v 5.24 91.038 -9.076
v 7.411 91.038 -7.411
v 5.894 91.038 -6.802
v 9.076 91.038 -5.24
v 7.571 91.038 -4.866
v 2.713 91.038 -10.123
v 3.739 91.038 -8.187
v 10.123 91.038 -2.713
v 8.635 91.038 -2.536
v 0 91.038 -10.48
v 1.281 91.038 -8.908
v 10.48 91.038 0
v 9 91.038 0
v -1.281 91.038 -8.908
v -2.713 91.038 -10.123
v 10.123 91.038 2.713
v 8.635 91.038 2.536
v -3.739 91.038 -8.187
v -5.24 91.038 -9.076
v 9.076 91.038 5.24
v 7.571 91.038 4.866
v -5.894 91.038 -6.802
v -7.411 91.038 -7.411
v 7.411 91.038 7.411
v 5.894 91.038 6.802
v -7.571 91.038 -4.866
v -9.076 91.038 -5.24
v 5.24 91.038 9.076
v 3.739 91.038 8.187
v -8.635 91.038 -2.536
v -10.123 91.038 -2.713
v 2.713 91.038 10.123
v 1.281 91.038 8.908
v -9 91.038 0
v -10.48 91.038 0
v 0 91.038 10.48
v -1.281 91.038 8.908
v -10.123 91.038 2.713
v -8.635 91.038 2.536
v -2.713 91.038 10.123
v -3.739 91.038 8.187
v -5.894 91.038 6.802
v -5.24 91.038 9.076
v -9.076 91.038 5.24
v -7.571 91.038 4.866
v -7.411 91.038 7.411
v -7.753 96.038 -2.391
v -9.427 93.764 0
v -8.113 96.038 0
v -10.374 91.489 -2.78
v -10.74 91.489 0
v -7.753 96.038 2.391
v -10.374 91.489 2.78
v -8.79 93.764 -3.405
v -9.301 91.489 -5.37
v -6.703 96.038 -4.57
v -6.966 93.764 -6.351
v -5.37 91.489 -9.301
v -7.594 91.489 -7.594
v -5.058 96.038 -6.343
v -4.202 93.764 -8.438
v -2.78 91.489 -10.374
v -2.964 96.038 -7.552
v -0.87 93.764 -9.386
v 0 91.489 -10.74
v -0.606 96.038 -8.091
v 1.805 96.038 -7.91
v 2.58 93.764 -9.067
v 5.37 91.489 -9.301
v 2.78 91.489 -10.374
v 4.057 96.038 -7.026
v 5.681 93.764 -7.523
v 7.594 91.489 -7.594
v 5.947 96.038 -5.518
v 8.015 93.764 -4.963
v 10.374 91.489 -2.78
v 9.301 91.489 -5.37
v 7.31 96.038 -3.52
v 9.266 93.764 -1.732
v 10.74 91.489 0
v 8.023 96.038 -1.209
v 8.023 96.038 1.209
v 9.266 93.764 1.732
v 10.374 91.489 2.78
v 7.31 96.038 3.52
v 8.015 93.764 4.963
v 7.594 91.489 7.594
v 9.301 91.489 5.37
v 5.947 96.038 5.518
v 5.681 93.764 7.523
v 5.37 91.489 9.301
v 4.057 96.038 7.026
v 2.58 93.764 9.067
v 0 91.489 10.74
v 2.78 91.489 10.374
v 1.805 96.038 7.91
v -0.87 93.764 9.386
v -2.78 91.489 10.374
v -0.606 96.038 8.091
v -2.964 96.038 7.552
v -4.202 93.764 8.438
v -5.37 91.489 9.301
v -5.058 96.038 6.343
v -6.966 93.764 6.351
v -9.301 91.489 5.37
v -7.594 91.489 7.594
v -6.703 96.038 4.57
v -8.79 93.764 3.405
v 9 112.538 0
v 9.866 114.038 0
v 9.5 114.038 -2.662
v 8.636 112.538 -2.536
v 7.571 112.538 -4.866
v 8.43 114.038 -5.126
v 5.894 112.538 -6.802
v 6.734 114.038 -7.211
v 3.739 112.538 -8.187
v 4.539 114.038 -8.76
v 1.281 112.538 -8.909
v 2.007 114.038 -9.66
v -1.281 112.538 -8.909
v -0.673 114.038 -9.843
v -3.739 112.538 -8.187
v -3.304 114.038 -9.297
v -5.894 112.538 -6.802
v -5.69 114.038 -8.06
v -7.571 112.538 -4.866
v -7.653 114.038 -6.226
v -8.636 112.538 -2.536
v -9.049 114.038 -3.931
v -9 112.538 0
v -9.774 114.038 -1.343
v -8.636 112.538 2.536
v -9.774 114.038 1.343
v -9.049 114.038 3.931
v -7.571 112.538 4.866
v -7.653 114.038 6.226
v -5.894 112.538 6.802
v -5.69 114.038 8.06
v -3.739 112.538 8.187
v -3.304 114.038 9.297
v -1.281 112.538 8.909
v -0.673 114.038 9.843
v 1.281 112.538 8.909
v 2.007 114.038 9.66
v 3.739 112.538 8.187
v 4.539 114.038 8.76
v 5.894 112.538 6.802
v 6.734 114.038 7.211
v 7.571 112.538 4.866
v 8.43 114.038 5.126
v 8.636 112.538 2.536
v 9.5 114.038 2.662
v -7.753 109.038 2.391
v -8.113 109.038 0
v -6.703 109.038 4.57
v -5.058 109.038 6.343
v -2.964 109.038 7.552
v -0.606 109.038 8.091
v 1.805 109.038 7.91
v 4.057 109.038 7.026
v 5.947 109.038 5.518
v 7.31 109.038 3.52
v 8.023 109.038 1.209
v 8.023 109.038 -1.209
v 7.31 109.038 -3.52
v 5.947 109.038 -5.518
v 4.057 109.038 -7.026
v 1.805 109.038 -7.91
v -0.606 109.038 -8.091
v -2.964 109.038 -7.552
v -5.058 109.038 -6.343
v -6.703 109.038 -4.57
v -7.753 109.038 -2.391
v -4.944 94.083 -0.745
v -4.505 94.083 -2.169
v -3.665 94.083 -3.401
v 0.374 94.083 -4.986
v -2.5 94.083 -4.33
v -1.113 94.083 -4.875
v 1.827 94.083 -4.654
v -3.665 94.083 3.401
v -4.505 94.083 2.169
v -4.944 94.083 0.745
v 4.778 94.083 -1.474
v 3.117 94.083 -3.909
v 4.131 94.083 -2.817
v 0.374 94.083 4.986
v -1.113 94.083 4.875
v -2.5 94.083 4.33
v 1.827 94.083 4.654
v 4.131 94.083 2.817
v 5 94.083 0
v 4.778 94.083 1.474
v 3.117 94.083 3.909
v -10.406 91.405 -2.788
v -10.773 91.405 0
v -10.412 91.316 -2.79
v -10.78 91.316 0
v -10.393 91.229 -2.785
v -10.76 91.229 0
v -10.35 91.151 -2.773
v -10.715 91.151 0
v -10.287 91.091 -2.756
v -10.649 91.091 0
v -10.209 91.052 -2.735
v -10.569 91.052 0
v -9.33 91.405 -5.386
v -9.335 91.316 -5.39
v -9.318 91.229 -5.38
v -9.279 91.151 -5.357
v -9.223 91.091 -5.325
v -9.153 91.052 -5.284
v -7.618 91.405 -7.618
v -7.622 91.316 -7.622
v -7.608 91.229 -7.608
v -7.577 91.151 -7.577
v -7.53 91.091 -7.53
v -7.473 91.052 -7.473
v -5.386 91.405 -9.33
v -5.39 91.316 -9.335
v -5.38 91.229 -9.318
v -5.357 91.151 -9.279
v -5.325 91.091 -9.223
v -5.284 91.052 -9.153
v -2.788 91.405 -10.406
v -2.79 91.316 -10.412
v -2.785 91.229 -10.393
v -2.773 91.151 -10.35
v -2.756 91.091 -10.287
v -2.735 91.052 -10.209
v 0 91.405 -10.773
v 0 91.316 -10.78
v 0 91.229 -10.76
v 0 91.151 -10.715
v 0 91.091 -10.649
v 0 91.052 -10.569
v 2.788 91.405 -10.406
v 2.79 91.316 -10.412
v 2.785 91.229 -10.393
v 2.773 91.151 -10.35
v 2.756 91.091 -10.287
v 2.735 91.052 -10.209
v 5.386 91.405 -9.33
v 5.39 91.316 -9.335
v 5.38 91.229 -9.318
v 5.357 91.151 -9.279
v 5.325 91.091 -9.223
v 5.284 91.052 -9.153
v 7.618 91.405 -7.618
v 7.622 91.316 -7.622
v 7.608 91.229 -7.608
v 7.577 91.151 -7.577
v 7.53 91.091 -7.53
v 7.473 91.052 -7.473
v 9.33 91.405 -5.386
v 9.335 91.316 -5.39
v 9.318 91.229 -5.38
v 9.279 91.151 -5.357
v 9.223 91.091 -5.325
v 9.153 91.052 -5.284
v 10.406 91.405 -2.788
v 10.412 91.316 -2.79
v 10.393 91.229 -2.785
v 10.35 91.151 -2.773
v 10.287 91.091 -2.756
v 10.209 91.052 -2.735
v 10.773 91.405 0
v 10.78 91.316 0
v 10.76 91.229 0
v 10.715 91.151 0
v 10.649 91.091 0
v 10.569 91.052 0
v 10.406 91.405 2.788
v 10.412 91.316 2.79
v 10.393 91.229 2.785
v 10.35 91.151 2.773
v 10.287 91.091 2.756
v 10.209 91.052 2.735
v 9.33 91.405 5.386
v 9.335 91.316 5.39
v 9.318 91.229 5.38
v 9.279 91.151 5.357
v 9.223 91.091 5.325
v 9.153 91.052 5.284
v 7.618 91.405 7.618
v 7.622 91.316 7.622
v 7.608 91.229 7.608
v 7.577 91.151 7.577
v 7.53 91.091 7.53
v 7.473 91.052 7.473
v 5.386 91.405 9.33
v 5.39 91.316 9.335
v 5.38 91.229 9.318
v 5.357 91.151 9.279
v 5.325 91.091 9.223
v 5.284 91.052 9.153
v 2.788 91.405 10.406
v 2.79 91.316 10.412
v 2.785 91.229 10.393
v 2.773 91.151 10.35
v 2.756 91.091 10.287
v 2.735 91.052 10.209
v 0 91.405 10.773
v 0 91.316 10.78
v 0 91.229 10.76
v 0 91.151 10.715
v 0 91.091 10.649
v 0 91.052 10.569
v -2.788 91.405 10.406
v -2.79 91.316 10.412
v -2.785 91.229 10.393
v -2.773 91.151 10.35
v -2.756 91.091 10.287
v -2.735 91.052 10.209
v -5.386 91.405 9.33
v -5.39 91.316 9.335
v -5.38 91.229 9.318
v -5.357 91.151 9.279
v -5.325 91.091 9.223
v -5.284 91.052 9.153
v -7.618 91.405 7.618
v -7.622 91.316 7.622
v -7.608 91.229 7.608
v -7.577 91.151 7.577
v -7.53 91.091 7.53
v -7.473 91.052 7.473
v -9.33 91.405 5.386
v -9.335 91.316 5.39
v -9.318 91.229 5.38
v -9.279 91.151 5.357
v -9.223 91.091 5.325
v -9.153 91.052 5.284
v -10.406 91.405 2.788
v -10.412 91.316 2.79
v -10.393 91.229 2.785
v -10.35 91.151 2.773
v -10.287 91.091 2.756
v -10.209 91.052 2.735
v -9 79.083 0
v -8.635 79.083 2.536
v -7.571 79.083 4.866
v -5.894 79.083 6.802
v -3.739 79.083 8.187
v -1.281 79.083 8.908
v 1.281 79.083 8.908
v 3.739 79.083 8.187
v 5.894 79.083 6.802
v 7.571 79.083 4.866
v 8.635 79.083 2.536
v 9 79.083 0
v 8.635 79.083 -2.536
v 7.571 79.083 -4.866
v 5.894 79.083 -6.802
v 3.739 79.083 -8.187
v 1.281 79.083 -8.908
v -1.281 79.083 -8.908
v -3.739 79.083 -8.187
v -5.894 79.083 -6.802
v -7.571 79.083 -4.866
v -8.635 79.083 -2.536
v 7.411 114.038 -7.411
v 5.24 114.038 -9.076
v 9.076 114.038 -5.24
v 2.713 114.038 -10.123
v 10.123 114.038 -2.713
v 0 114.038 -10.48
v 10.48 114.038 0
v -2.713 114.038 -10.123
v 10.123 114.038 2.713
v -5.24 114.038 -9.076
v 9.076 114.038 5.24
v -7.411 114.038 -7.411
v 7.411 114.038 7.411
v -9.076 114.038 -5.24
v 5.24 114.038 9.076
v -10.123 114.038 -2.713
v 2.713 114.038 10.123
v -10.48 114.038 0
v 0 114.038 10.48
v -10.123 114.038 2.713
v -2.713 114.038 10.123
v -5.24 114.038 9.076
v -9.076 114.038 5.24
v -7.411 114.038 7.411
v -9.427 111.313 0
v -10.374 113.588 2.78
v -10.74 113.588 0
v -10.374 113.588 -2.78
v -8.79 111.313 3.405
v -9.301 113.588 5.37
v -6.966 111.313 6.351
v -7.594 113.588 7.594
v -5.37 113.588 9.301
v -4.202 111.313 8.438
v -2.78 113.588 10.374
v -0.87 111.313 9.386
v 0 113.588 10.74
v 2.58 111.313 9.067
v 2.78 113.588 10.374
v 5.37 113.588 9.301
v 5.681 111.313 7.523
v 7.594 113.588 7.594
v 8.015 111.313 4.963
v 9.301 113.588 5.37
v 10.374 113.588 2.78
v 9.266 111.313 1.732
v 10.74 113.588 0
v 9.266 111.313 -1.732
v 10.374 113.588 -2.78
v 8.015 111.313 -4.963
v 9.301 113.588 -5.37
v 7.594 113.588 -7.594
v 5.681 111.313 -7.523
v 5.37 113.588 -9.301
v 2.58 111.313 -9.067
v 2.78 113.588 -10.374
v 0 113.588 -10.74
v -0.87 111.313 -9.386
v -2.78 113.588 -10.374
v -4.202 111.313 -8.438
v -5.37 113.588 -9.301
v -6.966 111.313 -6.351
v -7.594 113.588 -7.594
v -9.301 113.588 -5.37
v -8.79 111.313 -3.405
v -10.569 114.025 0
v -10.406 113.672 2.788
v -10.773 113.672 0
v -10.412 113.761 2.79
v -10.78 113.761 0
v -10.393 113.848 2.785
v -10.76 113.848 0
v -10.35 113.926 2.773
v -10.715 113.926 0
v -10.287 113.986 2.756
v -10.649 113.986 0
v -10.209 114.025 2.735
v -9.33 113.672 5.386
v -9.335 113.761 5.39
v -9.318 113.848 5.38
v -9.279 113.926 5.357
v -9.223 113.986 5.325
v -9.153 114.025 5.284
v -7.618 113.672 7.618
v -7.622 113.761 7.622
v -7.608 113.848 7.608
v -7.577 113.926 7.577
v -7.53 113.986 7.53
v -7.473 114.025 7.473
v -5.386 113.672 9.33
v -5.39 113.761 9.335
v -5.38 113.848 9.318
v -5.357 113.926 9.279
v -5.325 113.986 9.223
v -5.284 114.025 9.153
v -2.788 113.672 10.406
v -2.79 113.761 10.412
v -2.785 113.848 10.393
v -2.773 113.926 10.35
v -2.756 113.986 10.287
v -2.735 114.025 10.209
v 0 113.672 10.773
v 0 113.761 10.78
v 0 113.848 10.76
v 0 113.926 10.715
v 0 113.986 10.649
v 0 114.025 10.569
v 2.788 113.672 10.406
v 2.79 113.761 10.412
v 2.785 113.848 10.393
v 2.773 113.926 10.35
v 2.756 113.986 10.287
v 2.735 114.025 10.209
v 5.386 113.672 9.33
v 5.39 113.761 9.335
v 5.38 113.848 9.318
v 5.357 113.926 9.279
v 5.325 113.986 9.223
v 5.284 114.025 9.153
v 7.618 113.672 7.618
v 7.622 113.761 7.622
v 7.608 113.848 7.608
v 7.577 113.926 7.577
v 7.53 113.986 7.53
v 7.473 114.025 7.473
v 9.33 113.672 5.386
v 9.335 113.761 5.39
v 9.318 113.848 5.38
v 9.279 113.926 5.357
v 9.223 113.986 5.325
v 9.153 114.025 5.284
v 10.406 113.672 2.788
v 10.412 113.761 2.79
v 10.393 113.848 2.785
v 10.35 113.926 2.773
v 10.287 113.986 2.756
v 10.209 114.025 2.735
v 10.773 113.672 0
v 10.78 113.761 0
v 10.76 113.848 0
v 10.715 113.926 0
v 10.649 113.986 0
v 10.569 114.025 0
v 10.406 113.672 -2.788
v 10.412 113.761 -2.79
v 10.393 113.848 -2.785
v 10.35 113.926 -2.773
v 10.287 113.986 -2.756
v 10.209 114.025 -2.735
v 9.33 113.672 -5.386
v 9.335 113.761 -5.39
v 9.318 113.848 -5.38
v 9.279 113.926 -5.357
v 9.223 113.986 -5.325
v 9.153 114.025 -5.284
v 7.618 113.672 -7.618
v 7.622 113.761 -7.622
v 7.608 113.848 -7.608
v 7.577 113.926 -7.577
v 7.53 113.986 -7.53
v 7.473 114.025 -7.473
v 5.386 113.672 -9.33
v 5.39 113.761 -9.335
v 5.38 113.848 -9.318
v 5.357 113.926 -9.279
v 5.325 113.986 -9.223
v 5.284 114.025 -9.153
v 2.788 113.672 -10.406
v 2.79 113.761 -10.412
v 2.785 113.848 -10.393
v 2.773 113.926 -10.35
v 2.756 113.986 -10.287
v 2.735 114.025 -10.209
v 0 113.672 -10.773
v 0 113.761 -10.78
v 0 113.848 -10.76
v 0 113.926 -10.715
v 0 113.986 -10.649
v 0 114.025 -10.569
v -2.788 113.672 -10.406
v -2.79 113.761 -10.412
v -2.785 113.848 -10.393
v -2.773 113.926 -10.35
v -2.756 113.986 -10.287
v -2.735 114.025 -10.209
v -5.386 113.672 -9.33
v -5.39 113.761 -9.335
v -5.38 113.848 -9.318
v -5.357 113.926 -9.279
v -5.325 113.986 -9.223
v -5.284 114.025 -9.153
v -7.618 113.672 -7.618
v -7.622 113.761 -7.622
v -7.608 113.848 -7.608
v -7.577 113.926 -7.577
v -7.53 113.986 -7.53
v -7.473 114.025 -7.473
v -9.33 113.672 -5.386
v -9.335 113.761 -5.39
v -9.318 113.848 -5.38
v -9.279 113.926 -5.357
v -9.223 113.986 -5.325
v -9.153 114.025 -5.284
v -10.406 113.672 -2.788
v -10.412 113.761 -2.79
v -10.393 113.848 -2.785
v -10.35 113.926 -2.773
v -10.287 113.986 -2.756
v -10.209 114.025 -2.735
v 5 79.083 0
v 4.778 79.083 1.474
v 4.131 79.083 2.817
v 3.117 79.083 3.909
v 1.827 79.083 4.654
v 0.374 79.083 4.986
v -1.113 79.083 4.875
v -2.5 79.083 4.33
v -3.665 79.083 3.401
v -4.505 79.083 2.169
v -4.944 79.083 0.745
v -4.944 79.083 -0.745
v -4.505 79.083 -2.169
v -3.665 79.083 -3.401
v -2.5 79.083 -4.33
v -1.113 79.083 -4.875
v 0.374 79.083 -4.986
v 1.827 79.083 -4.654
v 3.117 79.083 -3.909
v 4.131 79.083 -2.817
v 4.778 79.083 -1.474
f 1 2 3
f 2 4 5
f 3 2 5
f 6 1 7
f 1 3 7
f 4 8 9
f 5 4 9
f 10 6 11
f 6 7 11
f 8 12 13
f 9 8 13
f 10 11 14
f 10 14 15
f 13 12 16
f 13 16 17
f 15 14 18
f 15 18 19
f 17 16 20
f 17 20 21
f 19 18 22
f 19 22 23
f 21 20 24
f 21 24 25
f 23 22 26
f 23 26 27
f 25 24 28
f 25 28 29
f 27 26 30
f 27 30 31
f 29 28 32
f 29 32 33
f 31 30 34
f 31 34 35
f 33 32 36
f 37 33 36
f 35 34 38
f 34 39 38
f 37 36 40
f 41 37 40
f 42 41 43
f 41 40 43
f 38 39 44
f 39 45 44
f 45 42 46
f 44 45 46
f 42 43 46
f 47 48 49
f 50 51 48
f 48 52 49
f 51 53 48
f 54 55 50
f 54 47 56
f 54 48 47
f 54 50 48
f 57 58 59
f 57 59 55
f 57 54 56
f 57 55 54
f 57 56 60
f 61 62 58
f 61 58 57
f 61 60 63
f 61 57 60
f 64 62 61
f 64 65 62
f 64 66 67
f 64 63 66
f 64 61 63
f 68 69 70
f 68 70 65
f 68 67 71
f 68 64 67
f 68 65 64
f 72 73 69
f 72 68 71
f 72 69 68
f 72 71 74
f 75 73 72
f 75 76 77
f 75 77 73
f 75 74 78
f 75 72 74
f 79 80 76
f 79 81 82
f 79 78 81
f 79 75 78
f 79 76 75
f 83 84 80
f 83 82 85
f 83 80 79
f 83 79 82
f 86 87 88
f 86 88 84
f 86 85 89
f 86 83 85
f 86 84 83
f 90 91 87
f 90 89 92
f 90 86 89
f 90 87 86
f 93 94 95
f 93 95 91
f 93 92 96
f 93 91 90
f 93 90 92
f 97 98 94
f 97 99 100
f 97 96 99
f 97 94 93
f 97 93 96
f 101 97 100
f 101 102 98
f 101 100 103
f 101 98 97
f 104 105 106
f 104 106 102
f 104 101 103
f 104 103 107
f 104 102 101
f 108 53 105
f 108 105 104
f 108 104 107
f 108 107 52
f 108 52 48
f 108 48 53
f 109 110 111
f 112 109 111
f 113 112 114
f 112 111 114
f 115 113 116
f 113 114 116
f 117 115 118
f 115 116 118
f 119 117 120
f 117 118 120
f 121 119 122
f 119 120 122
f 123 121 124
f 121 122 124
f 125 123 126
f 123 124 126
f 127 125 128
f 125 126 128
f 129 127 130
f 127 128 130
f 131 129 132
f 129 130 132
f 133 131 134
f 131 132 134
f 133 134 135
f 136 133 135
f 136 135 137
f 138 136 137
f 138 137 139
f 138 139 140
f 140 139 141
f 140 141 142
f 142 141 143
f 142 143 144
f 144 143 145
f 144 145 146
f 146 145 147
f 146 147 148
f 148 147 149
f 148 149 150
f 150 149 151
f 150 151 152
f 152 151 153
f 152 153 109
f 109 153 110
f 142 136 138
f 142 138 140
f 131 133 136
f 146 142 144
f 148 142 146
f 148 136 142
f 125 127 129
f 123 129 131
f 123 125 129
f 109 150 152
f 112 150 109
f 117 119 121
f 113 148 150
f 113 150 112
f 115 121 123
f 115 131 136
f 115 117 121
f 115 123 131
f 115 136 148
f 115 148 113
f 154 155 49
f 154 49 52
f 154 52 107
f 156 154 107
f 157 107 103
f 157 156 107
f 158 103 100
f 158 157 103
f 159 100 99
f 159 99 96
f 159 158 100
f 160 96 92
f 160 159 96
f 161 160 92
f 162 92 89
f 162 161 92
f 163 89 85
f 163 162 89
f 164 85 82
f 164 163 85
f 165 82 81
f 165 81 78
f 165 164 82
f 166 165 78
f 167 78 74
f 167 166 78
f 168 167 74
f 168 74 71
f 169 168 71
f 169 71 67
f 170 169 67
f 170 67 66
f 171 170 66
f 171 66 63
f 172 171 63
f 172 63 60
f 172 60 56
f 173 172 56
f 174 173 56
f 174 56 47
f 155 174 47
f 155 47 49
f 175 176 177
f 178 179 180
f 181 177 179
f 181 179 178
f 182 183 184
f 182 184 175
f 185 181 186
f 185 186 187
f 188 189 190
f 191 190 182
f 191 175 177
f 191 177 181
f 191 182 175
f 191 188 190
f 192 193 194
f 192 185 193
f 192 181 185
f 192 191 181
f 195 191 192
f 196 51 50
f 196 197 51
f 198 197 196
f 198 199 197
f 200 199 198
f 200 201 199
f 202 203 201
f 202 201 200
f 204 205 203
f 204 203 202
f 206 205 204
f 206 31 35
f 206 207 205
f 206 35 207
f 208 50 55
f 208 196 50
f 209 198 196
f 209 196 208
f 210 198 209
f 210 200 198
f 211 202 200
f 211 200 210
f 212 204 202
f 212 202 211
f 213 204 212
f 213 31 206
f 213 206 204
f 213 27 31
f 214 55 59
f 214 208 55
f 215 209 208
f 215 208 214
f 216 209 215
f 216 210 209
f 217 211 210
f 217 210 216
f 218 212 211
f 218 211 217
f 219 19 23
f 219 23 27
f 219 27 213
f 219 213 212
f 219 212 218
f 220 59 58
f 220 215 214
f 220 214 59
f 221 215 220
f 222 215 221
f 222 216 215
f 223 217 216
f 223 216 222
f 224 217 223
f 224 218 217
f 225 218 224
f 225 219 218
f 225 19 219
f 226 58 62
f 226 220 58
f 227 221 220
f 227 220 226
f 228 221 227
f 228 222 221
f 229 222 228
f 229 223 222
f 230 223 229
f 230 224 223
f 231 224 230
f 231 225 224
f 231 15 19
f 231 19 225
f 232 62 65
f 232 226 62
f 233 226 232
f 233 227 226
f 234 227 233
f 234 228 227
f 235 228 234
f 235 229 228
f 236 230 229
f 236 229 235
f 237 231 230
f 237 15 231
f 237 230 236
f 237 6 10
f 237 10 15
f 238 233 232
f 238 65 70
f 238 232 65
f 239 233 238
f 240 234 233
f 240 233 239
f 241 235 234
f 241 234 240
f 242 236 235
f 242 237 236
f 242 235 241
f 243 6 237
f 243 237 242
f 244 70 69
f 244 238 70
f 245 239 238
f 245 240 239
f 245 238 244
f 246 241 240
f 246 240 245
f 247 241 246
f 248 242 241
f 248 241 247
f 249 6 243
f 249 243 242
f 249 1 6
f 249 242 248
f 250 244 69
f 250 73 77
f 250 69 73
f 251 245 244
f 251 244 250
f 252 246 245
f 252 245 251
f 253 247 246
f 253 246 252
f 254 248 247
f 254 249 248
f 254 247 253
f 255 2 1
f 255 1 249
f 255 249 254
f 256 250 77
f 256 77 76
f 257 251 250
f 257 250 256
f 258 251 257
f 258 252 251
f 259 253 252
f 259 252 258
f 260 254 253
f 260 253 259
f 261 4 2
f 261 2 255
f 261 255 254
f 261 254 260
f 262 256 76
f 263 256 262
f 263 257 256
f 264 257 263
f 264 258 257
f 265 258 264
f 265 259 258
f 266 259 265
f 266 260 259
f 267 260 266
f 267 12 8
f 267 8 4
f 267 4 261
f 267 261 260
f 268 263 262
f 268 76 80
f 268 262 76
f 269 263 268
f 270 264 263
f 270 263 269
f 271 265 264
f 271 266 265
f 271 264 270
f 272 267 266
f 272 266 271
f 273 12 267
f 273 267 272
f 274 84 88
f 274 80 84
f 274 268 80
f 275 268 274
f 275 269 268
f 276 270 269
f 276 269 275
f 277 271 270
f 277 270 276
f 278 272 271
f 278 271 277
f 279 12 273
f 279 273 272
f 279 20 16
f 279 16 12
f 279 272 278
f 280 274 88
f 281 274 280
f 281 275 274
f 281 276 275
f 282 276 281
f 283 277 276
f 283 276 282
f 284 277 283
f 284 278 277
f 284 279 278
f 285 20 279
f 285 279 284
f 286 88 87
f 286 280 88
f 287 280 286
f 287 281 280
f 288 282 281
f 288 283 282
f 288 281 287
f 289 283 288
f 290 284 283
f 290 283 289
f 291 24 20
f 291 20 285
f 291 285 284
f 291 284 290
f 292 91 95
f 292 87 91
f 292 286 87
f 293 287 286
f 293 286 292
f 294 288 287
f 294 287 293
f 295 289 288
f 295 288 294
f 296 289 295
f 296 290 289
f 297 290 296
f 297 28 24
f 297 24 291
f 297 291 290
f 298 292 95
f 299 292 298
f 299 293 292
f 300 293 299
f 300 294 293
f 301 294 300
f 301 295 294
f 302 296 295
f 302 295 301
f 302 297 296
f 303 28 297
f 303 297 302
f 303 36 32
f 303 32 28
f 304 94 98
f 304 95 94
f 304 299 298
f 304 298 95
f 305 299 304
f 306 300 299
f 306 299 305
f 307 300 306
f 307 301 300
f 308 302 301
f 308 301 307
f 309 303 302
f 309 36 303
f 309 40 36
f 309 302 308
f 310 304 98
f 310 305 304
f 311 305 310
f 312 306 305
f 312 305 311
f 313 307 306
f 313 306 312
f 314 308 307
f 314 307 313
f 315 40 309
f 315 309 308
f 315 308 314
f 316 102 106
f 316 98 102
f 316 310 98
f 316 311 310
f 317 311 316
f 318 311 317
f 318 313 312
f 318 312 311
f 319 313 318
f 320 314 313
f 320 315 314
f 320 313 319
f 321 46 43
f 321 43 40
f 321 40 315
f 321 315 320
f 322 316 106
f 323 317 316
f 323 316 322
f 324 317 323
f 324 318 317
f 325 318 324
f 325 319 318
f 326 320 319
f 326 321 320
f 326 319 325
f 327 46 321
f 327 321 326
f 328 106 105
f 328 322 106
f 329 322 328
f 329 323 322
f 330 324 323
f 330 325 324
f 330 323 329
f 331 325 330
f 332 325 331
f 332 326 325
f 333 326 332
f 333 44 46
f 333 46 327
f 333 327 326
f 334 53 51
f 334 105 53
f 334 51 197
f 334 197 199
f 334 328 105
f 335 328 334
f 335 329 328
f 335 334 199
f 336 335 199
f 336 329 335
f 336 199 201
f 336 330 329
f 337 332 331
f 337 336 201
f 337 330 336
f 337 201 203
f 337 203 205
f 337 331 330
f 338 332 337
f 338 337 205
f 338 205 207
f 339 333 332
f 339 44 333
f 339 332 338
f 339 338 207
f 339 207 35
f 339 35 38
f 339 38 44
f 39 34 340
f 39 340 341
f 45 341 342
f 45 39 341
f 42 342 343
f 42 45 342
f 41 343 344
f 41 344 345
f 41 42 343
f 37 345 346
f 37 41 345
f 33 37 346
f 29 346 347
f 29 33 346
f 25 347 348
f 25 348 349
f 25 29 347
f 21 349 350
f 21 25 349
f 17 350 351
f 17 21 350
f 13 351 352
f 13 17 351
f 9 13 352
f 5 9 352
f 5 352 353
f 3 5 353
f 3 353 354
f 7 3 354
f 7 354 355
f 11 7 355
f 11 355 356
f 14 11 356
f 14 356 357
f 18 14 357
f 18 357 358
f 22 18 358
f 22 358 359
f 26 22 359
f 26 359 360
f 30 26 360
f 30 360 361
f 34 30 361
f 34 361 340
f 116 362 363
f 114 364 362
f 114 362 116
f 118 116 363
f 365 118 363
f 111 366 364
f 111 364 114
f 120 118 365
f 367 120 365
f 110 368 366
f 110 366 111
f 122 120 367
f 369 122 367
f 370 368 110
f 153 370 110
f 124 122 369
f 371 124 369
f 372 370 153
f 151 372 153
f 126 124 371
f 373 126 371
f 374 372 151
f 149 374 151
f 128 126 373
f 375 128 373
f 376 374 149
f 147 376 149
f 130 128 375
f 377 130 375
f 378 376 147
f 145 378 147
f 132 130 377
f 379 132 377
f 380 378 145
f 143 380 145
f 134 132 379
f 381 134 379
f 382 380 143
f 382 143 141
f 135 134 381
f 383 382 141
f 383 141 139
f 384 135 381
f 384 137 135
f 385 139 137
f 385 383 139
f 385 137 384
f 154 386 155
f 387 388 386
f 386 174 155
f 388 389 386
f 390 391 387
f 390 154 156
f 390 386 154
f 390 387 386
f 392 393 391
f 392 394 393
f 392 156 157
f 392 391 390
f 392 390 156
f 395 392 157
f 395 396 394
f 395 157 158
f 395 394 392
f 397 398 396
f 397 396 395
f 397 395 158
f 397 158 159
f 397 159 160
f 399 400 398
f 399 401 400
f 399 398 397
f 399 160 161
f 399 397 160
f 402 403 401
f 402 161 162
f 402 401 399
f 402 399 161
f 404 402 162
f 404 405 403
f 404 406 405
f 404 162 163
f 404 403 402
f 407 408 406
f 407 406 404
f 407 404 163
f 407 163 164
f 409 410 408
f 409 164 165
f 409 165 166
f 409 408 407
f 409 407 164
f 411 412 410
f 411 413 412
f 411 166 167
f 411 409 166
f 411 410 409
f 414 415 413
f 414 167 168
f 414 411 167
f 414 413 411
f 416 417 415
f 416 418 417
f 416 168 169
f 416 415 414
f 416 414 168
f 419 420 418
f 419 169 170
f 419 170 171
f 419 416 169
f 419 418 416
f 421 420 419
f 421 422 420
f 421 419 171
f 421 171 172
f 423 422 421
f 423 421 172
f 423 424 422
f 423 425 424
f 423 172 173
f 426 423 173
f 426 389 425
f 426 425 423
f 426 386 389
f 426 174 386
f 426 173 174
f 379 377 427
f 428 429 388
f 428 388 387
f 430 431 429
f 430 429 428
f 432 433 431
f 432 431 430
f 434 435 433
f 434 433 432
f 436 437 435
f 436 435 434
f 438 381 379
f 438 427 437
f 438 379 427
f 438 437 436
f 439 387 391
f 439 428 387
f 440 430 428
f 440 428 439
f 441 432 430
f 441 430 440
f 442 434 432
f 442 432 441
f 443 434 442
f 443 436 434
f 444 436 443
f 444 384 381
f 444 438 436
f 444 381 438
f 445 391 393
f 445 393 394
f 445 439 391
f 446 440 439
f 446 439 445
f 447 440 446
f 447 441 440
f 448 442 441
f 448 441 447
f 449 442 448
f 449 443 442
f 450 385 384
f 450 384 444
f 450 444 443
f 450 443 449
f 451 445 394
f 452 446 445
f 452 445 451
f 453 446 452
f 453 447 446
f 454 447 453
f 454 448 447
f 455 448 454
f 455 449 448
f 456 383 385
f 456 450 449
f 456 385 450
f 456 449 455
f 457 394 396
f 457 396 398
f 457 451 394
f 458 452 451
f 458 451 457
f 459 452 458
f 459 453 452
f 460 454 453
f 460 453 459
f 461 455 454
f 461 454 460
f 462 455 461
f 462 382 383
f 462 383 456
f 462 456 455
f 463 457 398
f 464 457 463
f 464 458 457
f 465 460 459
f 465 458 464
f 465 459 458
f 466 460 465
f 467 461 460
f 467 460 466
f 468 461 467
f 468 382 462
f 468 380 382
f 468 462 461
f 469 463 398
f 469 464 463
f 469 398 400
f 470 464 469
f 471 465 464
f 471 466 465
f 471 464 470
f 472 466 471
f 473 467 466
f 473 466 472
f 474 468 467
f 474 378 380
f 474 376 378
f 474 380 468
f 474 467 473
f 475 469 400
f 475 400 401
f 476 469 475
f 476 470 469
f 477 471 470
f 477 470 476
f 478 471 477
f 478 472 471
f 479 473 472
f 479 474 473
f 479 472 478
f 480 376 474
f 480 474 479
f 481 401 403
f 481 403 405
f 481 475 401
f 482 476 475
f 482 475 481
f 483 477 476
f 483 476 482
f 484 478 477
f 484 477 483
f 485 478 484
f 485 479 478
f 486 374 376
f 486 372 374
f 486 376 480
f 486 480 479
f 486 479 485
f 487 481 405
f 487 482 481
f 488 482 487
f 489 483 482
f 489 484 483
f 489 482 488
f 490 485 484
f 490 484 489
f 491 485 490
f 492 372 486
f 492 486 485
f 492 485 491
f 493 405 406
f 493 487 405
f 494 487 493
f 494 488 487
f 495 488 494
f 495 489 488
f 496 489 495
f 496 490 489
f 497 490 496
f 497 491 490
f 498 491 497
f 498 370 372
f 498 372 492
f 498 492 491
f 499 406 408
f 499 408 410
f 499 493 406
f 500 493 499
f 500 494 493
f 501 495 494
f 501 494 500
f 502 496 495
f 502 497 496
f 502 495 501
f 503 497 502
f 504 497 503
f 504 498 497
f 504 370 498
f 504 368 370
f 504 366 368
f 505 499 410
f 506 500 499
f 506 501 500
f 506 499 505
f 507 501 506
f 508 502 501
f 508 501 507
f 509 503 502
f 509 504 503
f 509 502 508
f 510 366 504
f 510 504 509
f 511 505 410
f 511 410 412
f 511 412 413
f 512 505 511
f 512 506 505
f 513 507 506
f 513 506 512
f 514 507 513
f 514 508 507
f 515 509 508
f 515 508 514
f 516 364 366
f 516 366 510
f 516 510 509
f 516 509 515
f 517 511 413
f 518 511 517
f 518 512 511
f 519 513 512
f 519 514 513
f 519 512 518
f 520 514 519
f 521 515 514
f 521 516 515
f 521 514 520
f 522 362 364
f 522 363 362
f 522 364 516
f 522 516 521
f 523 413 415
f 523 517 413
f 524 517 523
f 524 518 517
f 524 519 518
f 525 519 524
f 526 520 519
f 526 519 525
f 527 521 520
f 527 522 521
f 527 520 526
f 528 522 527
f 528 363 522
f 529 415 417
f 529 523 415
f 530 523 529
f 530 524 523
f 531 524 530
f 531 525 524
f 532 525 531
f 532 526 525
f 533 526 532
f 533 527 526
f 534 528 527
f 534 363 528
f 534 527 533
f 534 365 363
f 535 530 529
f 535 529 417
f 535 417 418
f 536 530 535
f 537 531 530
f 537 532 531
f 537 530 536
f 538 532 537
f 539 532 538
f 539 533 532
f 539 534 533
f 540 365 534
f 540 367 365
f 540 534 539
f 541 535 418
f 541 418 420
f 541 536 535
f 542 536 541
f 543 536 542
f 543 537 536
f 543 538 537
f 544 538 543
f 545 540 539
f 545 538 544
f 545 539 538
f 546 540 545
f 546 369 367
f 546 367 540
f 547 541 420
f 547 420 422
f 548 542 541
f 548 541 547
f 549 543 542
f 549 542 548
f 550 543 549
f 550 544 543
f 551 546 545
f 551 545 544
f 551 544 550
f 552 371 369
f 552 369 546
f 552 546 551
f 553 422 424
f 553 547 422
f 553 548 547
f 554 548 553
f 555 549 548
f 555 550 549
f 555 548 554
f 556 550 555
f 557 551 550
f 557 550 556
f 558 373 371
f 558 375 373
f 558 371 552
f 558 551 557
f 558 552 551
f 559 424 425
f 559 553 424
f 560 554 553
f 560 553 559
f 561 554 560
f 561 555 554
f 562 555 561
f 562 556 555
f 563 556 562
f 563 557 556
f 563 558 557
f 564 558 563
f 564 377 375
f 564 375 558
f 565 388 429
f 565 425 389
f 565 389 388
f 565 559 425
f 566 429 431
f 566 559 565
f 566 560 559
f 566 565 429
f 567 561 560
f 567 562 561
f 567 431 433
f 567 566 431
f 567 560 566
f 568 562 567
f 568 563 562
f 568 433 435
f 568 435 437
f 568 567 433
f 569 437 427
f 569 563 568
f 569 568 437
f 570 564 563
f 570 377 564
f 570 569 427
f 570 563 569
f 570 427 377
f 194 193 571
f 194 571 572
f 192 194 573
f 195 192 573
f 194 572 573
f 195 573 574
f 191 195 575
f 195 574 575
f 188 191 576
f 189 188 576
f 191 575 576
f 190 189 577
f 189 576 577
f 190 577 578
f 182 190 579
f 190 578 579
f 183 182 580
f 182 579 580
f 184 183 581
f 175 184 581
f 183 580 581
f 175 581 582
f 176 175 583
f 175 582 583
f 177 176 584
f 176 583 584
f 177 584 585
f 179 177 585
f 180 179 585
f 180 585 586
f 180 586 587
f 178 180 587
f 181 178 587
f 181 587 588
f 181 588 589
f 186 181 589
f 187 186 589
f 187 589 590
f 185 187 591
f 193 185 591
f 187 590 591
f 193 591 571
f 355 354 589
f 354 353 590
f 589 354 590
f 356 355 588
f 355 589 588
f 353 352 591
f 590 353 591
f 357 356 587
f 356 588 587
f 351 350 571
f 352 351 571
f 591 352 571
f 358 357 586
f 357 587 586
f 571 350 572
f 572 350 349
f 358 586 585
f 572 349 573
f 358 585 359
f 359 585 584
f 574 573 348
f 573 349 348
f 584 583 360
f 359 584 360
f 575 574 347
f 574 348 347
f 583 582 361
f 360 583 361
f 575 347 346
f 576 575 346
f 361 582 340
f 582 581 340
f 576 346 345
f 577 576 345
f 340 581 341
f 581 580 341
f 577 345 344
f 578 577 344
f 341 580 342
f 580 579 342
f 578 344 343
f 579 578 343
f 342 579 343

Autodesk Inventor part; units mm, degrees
ref_plane "YZ Plane" through (0, 0, 0) normal (1, 0, 0) x (0, 1, 0)
ref_plane "XZ Plane" through (0, 0, 0) normal (0, 1, 0) x (-1, 0, 0)
ref_plane "XY Plane" through (0, 0, 0) normal (0, 0, 1) x (1, 0, 0)
sketch "Sketch1" plane through (0, 0, 0) normal (0, 0, 1) x (1, 0, 0)
  line L0 (0, 85.0385) -> (0, 91.0385)
  line L1 (-9, 91.0385) -> (-10, 91.0385)
  line L2 (0, 61.1) -> (0, 78.9)
  line L3 (0, 91.0385) -> (0, 96.0385)
  line L4 (-10, 91.0385) -> (-11, 91.0385)
  line L5 (-9, 91.0385) -> (-9, 85.0385)
  line L6 (-11, 91.0385) -> (-8.1132, 96.0385)
  line L7 (0, 96.0385) -> (0, 109.0385)
  line L8 (0, 96.0385) -> (0, 102.5385) construction
  line L9 (0, 102.5385) -> (-10.5, 102.5385) construction
  line L10 (-11, 114.0385) -> (-8.1132, 109.0385)
  line L11 (0, 114.0385) -> (-8, 114.0385)
  line L12 (-10, 114.0385) -> (-11, 114.0385)
  line L13 (0, 114.0385) -> (-10, 114.0385)
  line L14 (0, 109.0385) -> (0, 114.0385)
  line L15 (-8.1132, 96.0385) -> (-8.1132, 109.0385)
  line L16 (0, 0) -> (0, 114.0385)
  line L17 (0, 85.0385) -> (0, 0)
  line L18 (14, 0) -> (-14, 0)
  line L19 (0, 78.9) -> (-9, 79.0832)
  line L20 (-12, 79.0832) -> (12, 79.0832)
  line L21 (-9, 79.0832) -> (-9, 85.0385)
  point P0 (-8, 264.0385)
  point P1 (-9, 241.0385)
  point P2 (0, 79.0832)
  dimension "d0" = 6
  dimension "d1" = 10
  dimension "d2" = 5
  dimension "d3" = 9
  dimension "d4" = 13
revolve "Revolution1" add sketch "Sketch1" angle 360 about axis through (0, 0, 0) along (0, 1, 0) contours L16 L20 L21 L5 L1 L4 L6 L15 L10 L12 L13 L11 L14 L7 L3 L0
sketch "Sketch2" plane through (0, 0, 0) normal (0, 0, 1) x (1, 0, 0)
  line L0 (8.1132, 109.0385) -> (11, 114.0385) construction
  line L1 (8.1132, 109.0385) -> (8.1132, 112.5385) construction
  line L2 (8.1132, 112.5385) -> (9.0002, 112.5385) construction
  line L3 (9.0002, 114.0385) -> (9.8662, 114.0385)
  line L4 (11, 114.0385) -> (-11, 114.0385) projected
  line L5 (9.8662, 114.0385) -> (9.0002, 112.5385)
  line L6 (8.1132, 109.0385) -> (-8.1132, 109.0385) projected
  line L7 (9.0002, 112.5385) -> (0, 112.5385)
  line L8 (9.0002, 114.0385) -> (0, 114.0385)
  line L9 (0, 109.0385) -> (0, 117.7347)
  point P0 (0, 0)
  point P1 (0, 112.5385)
  dimension "d6" = 3.5
  dimension "d7" = 0.887
  dimension "d8" = 1.5
  dimension "d9" = 0.866
revolve "Revolution2" cut sketch "Sketch2" angle 360 about axis through (0, 109.0385, 0) along (0, 1, 0)
fillet "Fillet1" radius 0.3 1 edges at (11, 114.0385, 0)
fillet "Fillet2" radius 0.3 1 edges at (11, 91.0385, 0)
sketch "Sketch3" plane through (0, 79.0832, 0) normal (0, -1, 0) x (1, 0, 0)
  circle A0 centre (0, 0) radius 5
  dimension "d13" = 10
extrude "Extrusion1" cut sketch "Sketch3" against normal blind 15
properties part number "emitter"
